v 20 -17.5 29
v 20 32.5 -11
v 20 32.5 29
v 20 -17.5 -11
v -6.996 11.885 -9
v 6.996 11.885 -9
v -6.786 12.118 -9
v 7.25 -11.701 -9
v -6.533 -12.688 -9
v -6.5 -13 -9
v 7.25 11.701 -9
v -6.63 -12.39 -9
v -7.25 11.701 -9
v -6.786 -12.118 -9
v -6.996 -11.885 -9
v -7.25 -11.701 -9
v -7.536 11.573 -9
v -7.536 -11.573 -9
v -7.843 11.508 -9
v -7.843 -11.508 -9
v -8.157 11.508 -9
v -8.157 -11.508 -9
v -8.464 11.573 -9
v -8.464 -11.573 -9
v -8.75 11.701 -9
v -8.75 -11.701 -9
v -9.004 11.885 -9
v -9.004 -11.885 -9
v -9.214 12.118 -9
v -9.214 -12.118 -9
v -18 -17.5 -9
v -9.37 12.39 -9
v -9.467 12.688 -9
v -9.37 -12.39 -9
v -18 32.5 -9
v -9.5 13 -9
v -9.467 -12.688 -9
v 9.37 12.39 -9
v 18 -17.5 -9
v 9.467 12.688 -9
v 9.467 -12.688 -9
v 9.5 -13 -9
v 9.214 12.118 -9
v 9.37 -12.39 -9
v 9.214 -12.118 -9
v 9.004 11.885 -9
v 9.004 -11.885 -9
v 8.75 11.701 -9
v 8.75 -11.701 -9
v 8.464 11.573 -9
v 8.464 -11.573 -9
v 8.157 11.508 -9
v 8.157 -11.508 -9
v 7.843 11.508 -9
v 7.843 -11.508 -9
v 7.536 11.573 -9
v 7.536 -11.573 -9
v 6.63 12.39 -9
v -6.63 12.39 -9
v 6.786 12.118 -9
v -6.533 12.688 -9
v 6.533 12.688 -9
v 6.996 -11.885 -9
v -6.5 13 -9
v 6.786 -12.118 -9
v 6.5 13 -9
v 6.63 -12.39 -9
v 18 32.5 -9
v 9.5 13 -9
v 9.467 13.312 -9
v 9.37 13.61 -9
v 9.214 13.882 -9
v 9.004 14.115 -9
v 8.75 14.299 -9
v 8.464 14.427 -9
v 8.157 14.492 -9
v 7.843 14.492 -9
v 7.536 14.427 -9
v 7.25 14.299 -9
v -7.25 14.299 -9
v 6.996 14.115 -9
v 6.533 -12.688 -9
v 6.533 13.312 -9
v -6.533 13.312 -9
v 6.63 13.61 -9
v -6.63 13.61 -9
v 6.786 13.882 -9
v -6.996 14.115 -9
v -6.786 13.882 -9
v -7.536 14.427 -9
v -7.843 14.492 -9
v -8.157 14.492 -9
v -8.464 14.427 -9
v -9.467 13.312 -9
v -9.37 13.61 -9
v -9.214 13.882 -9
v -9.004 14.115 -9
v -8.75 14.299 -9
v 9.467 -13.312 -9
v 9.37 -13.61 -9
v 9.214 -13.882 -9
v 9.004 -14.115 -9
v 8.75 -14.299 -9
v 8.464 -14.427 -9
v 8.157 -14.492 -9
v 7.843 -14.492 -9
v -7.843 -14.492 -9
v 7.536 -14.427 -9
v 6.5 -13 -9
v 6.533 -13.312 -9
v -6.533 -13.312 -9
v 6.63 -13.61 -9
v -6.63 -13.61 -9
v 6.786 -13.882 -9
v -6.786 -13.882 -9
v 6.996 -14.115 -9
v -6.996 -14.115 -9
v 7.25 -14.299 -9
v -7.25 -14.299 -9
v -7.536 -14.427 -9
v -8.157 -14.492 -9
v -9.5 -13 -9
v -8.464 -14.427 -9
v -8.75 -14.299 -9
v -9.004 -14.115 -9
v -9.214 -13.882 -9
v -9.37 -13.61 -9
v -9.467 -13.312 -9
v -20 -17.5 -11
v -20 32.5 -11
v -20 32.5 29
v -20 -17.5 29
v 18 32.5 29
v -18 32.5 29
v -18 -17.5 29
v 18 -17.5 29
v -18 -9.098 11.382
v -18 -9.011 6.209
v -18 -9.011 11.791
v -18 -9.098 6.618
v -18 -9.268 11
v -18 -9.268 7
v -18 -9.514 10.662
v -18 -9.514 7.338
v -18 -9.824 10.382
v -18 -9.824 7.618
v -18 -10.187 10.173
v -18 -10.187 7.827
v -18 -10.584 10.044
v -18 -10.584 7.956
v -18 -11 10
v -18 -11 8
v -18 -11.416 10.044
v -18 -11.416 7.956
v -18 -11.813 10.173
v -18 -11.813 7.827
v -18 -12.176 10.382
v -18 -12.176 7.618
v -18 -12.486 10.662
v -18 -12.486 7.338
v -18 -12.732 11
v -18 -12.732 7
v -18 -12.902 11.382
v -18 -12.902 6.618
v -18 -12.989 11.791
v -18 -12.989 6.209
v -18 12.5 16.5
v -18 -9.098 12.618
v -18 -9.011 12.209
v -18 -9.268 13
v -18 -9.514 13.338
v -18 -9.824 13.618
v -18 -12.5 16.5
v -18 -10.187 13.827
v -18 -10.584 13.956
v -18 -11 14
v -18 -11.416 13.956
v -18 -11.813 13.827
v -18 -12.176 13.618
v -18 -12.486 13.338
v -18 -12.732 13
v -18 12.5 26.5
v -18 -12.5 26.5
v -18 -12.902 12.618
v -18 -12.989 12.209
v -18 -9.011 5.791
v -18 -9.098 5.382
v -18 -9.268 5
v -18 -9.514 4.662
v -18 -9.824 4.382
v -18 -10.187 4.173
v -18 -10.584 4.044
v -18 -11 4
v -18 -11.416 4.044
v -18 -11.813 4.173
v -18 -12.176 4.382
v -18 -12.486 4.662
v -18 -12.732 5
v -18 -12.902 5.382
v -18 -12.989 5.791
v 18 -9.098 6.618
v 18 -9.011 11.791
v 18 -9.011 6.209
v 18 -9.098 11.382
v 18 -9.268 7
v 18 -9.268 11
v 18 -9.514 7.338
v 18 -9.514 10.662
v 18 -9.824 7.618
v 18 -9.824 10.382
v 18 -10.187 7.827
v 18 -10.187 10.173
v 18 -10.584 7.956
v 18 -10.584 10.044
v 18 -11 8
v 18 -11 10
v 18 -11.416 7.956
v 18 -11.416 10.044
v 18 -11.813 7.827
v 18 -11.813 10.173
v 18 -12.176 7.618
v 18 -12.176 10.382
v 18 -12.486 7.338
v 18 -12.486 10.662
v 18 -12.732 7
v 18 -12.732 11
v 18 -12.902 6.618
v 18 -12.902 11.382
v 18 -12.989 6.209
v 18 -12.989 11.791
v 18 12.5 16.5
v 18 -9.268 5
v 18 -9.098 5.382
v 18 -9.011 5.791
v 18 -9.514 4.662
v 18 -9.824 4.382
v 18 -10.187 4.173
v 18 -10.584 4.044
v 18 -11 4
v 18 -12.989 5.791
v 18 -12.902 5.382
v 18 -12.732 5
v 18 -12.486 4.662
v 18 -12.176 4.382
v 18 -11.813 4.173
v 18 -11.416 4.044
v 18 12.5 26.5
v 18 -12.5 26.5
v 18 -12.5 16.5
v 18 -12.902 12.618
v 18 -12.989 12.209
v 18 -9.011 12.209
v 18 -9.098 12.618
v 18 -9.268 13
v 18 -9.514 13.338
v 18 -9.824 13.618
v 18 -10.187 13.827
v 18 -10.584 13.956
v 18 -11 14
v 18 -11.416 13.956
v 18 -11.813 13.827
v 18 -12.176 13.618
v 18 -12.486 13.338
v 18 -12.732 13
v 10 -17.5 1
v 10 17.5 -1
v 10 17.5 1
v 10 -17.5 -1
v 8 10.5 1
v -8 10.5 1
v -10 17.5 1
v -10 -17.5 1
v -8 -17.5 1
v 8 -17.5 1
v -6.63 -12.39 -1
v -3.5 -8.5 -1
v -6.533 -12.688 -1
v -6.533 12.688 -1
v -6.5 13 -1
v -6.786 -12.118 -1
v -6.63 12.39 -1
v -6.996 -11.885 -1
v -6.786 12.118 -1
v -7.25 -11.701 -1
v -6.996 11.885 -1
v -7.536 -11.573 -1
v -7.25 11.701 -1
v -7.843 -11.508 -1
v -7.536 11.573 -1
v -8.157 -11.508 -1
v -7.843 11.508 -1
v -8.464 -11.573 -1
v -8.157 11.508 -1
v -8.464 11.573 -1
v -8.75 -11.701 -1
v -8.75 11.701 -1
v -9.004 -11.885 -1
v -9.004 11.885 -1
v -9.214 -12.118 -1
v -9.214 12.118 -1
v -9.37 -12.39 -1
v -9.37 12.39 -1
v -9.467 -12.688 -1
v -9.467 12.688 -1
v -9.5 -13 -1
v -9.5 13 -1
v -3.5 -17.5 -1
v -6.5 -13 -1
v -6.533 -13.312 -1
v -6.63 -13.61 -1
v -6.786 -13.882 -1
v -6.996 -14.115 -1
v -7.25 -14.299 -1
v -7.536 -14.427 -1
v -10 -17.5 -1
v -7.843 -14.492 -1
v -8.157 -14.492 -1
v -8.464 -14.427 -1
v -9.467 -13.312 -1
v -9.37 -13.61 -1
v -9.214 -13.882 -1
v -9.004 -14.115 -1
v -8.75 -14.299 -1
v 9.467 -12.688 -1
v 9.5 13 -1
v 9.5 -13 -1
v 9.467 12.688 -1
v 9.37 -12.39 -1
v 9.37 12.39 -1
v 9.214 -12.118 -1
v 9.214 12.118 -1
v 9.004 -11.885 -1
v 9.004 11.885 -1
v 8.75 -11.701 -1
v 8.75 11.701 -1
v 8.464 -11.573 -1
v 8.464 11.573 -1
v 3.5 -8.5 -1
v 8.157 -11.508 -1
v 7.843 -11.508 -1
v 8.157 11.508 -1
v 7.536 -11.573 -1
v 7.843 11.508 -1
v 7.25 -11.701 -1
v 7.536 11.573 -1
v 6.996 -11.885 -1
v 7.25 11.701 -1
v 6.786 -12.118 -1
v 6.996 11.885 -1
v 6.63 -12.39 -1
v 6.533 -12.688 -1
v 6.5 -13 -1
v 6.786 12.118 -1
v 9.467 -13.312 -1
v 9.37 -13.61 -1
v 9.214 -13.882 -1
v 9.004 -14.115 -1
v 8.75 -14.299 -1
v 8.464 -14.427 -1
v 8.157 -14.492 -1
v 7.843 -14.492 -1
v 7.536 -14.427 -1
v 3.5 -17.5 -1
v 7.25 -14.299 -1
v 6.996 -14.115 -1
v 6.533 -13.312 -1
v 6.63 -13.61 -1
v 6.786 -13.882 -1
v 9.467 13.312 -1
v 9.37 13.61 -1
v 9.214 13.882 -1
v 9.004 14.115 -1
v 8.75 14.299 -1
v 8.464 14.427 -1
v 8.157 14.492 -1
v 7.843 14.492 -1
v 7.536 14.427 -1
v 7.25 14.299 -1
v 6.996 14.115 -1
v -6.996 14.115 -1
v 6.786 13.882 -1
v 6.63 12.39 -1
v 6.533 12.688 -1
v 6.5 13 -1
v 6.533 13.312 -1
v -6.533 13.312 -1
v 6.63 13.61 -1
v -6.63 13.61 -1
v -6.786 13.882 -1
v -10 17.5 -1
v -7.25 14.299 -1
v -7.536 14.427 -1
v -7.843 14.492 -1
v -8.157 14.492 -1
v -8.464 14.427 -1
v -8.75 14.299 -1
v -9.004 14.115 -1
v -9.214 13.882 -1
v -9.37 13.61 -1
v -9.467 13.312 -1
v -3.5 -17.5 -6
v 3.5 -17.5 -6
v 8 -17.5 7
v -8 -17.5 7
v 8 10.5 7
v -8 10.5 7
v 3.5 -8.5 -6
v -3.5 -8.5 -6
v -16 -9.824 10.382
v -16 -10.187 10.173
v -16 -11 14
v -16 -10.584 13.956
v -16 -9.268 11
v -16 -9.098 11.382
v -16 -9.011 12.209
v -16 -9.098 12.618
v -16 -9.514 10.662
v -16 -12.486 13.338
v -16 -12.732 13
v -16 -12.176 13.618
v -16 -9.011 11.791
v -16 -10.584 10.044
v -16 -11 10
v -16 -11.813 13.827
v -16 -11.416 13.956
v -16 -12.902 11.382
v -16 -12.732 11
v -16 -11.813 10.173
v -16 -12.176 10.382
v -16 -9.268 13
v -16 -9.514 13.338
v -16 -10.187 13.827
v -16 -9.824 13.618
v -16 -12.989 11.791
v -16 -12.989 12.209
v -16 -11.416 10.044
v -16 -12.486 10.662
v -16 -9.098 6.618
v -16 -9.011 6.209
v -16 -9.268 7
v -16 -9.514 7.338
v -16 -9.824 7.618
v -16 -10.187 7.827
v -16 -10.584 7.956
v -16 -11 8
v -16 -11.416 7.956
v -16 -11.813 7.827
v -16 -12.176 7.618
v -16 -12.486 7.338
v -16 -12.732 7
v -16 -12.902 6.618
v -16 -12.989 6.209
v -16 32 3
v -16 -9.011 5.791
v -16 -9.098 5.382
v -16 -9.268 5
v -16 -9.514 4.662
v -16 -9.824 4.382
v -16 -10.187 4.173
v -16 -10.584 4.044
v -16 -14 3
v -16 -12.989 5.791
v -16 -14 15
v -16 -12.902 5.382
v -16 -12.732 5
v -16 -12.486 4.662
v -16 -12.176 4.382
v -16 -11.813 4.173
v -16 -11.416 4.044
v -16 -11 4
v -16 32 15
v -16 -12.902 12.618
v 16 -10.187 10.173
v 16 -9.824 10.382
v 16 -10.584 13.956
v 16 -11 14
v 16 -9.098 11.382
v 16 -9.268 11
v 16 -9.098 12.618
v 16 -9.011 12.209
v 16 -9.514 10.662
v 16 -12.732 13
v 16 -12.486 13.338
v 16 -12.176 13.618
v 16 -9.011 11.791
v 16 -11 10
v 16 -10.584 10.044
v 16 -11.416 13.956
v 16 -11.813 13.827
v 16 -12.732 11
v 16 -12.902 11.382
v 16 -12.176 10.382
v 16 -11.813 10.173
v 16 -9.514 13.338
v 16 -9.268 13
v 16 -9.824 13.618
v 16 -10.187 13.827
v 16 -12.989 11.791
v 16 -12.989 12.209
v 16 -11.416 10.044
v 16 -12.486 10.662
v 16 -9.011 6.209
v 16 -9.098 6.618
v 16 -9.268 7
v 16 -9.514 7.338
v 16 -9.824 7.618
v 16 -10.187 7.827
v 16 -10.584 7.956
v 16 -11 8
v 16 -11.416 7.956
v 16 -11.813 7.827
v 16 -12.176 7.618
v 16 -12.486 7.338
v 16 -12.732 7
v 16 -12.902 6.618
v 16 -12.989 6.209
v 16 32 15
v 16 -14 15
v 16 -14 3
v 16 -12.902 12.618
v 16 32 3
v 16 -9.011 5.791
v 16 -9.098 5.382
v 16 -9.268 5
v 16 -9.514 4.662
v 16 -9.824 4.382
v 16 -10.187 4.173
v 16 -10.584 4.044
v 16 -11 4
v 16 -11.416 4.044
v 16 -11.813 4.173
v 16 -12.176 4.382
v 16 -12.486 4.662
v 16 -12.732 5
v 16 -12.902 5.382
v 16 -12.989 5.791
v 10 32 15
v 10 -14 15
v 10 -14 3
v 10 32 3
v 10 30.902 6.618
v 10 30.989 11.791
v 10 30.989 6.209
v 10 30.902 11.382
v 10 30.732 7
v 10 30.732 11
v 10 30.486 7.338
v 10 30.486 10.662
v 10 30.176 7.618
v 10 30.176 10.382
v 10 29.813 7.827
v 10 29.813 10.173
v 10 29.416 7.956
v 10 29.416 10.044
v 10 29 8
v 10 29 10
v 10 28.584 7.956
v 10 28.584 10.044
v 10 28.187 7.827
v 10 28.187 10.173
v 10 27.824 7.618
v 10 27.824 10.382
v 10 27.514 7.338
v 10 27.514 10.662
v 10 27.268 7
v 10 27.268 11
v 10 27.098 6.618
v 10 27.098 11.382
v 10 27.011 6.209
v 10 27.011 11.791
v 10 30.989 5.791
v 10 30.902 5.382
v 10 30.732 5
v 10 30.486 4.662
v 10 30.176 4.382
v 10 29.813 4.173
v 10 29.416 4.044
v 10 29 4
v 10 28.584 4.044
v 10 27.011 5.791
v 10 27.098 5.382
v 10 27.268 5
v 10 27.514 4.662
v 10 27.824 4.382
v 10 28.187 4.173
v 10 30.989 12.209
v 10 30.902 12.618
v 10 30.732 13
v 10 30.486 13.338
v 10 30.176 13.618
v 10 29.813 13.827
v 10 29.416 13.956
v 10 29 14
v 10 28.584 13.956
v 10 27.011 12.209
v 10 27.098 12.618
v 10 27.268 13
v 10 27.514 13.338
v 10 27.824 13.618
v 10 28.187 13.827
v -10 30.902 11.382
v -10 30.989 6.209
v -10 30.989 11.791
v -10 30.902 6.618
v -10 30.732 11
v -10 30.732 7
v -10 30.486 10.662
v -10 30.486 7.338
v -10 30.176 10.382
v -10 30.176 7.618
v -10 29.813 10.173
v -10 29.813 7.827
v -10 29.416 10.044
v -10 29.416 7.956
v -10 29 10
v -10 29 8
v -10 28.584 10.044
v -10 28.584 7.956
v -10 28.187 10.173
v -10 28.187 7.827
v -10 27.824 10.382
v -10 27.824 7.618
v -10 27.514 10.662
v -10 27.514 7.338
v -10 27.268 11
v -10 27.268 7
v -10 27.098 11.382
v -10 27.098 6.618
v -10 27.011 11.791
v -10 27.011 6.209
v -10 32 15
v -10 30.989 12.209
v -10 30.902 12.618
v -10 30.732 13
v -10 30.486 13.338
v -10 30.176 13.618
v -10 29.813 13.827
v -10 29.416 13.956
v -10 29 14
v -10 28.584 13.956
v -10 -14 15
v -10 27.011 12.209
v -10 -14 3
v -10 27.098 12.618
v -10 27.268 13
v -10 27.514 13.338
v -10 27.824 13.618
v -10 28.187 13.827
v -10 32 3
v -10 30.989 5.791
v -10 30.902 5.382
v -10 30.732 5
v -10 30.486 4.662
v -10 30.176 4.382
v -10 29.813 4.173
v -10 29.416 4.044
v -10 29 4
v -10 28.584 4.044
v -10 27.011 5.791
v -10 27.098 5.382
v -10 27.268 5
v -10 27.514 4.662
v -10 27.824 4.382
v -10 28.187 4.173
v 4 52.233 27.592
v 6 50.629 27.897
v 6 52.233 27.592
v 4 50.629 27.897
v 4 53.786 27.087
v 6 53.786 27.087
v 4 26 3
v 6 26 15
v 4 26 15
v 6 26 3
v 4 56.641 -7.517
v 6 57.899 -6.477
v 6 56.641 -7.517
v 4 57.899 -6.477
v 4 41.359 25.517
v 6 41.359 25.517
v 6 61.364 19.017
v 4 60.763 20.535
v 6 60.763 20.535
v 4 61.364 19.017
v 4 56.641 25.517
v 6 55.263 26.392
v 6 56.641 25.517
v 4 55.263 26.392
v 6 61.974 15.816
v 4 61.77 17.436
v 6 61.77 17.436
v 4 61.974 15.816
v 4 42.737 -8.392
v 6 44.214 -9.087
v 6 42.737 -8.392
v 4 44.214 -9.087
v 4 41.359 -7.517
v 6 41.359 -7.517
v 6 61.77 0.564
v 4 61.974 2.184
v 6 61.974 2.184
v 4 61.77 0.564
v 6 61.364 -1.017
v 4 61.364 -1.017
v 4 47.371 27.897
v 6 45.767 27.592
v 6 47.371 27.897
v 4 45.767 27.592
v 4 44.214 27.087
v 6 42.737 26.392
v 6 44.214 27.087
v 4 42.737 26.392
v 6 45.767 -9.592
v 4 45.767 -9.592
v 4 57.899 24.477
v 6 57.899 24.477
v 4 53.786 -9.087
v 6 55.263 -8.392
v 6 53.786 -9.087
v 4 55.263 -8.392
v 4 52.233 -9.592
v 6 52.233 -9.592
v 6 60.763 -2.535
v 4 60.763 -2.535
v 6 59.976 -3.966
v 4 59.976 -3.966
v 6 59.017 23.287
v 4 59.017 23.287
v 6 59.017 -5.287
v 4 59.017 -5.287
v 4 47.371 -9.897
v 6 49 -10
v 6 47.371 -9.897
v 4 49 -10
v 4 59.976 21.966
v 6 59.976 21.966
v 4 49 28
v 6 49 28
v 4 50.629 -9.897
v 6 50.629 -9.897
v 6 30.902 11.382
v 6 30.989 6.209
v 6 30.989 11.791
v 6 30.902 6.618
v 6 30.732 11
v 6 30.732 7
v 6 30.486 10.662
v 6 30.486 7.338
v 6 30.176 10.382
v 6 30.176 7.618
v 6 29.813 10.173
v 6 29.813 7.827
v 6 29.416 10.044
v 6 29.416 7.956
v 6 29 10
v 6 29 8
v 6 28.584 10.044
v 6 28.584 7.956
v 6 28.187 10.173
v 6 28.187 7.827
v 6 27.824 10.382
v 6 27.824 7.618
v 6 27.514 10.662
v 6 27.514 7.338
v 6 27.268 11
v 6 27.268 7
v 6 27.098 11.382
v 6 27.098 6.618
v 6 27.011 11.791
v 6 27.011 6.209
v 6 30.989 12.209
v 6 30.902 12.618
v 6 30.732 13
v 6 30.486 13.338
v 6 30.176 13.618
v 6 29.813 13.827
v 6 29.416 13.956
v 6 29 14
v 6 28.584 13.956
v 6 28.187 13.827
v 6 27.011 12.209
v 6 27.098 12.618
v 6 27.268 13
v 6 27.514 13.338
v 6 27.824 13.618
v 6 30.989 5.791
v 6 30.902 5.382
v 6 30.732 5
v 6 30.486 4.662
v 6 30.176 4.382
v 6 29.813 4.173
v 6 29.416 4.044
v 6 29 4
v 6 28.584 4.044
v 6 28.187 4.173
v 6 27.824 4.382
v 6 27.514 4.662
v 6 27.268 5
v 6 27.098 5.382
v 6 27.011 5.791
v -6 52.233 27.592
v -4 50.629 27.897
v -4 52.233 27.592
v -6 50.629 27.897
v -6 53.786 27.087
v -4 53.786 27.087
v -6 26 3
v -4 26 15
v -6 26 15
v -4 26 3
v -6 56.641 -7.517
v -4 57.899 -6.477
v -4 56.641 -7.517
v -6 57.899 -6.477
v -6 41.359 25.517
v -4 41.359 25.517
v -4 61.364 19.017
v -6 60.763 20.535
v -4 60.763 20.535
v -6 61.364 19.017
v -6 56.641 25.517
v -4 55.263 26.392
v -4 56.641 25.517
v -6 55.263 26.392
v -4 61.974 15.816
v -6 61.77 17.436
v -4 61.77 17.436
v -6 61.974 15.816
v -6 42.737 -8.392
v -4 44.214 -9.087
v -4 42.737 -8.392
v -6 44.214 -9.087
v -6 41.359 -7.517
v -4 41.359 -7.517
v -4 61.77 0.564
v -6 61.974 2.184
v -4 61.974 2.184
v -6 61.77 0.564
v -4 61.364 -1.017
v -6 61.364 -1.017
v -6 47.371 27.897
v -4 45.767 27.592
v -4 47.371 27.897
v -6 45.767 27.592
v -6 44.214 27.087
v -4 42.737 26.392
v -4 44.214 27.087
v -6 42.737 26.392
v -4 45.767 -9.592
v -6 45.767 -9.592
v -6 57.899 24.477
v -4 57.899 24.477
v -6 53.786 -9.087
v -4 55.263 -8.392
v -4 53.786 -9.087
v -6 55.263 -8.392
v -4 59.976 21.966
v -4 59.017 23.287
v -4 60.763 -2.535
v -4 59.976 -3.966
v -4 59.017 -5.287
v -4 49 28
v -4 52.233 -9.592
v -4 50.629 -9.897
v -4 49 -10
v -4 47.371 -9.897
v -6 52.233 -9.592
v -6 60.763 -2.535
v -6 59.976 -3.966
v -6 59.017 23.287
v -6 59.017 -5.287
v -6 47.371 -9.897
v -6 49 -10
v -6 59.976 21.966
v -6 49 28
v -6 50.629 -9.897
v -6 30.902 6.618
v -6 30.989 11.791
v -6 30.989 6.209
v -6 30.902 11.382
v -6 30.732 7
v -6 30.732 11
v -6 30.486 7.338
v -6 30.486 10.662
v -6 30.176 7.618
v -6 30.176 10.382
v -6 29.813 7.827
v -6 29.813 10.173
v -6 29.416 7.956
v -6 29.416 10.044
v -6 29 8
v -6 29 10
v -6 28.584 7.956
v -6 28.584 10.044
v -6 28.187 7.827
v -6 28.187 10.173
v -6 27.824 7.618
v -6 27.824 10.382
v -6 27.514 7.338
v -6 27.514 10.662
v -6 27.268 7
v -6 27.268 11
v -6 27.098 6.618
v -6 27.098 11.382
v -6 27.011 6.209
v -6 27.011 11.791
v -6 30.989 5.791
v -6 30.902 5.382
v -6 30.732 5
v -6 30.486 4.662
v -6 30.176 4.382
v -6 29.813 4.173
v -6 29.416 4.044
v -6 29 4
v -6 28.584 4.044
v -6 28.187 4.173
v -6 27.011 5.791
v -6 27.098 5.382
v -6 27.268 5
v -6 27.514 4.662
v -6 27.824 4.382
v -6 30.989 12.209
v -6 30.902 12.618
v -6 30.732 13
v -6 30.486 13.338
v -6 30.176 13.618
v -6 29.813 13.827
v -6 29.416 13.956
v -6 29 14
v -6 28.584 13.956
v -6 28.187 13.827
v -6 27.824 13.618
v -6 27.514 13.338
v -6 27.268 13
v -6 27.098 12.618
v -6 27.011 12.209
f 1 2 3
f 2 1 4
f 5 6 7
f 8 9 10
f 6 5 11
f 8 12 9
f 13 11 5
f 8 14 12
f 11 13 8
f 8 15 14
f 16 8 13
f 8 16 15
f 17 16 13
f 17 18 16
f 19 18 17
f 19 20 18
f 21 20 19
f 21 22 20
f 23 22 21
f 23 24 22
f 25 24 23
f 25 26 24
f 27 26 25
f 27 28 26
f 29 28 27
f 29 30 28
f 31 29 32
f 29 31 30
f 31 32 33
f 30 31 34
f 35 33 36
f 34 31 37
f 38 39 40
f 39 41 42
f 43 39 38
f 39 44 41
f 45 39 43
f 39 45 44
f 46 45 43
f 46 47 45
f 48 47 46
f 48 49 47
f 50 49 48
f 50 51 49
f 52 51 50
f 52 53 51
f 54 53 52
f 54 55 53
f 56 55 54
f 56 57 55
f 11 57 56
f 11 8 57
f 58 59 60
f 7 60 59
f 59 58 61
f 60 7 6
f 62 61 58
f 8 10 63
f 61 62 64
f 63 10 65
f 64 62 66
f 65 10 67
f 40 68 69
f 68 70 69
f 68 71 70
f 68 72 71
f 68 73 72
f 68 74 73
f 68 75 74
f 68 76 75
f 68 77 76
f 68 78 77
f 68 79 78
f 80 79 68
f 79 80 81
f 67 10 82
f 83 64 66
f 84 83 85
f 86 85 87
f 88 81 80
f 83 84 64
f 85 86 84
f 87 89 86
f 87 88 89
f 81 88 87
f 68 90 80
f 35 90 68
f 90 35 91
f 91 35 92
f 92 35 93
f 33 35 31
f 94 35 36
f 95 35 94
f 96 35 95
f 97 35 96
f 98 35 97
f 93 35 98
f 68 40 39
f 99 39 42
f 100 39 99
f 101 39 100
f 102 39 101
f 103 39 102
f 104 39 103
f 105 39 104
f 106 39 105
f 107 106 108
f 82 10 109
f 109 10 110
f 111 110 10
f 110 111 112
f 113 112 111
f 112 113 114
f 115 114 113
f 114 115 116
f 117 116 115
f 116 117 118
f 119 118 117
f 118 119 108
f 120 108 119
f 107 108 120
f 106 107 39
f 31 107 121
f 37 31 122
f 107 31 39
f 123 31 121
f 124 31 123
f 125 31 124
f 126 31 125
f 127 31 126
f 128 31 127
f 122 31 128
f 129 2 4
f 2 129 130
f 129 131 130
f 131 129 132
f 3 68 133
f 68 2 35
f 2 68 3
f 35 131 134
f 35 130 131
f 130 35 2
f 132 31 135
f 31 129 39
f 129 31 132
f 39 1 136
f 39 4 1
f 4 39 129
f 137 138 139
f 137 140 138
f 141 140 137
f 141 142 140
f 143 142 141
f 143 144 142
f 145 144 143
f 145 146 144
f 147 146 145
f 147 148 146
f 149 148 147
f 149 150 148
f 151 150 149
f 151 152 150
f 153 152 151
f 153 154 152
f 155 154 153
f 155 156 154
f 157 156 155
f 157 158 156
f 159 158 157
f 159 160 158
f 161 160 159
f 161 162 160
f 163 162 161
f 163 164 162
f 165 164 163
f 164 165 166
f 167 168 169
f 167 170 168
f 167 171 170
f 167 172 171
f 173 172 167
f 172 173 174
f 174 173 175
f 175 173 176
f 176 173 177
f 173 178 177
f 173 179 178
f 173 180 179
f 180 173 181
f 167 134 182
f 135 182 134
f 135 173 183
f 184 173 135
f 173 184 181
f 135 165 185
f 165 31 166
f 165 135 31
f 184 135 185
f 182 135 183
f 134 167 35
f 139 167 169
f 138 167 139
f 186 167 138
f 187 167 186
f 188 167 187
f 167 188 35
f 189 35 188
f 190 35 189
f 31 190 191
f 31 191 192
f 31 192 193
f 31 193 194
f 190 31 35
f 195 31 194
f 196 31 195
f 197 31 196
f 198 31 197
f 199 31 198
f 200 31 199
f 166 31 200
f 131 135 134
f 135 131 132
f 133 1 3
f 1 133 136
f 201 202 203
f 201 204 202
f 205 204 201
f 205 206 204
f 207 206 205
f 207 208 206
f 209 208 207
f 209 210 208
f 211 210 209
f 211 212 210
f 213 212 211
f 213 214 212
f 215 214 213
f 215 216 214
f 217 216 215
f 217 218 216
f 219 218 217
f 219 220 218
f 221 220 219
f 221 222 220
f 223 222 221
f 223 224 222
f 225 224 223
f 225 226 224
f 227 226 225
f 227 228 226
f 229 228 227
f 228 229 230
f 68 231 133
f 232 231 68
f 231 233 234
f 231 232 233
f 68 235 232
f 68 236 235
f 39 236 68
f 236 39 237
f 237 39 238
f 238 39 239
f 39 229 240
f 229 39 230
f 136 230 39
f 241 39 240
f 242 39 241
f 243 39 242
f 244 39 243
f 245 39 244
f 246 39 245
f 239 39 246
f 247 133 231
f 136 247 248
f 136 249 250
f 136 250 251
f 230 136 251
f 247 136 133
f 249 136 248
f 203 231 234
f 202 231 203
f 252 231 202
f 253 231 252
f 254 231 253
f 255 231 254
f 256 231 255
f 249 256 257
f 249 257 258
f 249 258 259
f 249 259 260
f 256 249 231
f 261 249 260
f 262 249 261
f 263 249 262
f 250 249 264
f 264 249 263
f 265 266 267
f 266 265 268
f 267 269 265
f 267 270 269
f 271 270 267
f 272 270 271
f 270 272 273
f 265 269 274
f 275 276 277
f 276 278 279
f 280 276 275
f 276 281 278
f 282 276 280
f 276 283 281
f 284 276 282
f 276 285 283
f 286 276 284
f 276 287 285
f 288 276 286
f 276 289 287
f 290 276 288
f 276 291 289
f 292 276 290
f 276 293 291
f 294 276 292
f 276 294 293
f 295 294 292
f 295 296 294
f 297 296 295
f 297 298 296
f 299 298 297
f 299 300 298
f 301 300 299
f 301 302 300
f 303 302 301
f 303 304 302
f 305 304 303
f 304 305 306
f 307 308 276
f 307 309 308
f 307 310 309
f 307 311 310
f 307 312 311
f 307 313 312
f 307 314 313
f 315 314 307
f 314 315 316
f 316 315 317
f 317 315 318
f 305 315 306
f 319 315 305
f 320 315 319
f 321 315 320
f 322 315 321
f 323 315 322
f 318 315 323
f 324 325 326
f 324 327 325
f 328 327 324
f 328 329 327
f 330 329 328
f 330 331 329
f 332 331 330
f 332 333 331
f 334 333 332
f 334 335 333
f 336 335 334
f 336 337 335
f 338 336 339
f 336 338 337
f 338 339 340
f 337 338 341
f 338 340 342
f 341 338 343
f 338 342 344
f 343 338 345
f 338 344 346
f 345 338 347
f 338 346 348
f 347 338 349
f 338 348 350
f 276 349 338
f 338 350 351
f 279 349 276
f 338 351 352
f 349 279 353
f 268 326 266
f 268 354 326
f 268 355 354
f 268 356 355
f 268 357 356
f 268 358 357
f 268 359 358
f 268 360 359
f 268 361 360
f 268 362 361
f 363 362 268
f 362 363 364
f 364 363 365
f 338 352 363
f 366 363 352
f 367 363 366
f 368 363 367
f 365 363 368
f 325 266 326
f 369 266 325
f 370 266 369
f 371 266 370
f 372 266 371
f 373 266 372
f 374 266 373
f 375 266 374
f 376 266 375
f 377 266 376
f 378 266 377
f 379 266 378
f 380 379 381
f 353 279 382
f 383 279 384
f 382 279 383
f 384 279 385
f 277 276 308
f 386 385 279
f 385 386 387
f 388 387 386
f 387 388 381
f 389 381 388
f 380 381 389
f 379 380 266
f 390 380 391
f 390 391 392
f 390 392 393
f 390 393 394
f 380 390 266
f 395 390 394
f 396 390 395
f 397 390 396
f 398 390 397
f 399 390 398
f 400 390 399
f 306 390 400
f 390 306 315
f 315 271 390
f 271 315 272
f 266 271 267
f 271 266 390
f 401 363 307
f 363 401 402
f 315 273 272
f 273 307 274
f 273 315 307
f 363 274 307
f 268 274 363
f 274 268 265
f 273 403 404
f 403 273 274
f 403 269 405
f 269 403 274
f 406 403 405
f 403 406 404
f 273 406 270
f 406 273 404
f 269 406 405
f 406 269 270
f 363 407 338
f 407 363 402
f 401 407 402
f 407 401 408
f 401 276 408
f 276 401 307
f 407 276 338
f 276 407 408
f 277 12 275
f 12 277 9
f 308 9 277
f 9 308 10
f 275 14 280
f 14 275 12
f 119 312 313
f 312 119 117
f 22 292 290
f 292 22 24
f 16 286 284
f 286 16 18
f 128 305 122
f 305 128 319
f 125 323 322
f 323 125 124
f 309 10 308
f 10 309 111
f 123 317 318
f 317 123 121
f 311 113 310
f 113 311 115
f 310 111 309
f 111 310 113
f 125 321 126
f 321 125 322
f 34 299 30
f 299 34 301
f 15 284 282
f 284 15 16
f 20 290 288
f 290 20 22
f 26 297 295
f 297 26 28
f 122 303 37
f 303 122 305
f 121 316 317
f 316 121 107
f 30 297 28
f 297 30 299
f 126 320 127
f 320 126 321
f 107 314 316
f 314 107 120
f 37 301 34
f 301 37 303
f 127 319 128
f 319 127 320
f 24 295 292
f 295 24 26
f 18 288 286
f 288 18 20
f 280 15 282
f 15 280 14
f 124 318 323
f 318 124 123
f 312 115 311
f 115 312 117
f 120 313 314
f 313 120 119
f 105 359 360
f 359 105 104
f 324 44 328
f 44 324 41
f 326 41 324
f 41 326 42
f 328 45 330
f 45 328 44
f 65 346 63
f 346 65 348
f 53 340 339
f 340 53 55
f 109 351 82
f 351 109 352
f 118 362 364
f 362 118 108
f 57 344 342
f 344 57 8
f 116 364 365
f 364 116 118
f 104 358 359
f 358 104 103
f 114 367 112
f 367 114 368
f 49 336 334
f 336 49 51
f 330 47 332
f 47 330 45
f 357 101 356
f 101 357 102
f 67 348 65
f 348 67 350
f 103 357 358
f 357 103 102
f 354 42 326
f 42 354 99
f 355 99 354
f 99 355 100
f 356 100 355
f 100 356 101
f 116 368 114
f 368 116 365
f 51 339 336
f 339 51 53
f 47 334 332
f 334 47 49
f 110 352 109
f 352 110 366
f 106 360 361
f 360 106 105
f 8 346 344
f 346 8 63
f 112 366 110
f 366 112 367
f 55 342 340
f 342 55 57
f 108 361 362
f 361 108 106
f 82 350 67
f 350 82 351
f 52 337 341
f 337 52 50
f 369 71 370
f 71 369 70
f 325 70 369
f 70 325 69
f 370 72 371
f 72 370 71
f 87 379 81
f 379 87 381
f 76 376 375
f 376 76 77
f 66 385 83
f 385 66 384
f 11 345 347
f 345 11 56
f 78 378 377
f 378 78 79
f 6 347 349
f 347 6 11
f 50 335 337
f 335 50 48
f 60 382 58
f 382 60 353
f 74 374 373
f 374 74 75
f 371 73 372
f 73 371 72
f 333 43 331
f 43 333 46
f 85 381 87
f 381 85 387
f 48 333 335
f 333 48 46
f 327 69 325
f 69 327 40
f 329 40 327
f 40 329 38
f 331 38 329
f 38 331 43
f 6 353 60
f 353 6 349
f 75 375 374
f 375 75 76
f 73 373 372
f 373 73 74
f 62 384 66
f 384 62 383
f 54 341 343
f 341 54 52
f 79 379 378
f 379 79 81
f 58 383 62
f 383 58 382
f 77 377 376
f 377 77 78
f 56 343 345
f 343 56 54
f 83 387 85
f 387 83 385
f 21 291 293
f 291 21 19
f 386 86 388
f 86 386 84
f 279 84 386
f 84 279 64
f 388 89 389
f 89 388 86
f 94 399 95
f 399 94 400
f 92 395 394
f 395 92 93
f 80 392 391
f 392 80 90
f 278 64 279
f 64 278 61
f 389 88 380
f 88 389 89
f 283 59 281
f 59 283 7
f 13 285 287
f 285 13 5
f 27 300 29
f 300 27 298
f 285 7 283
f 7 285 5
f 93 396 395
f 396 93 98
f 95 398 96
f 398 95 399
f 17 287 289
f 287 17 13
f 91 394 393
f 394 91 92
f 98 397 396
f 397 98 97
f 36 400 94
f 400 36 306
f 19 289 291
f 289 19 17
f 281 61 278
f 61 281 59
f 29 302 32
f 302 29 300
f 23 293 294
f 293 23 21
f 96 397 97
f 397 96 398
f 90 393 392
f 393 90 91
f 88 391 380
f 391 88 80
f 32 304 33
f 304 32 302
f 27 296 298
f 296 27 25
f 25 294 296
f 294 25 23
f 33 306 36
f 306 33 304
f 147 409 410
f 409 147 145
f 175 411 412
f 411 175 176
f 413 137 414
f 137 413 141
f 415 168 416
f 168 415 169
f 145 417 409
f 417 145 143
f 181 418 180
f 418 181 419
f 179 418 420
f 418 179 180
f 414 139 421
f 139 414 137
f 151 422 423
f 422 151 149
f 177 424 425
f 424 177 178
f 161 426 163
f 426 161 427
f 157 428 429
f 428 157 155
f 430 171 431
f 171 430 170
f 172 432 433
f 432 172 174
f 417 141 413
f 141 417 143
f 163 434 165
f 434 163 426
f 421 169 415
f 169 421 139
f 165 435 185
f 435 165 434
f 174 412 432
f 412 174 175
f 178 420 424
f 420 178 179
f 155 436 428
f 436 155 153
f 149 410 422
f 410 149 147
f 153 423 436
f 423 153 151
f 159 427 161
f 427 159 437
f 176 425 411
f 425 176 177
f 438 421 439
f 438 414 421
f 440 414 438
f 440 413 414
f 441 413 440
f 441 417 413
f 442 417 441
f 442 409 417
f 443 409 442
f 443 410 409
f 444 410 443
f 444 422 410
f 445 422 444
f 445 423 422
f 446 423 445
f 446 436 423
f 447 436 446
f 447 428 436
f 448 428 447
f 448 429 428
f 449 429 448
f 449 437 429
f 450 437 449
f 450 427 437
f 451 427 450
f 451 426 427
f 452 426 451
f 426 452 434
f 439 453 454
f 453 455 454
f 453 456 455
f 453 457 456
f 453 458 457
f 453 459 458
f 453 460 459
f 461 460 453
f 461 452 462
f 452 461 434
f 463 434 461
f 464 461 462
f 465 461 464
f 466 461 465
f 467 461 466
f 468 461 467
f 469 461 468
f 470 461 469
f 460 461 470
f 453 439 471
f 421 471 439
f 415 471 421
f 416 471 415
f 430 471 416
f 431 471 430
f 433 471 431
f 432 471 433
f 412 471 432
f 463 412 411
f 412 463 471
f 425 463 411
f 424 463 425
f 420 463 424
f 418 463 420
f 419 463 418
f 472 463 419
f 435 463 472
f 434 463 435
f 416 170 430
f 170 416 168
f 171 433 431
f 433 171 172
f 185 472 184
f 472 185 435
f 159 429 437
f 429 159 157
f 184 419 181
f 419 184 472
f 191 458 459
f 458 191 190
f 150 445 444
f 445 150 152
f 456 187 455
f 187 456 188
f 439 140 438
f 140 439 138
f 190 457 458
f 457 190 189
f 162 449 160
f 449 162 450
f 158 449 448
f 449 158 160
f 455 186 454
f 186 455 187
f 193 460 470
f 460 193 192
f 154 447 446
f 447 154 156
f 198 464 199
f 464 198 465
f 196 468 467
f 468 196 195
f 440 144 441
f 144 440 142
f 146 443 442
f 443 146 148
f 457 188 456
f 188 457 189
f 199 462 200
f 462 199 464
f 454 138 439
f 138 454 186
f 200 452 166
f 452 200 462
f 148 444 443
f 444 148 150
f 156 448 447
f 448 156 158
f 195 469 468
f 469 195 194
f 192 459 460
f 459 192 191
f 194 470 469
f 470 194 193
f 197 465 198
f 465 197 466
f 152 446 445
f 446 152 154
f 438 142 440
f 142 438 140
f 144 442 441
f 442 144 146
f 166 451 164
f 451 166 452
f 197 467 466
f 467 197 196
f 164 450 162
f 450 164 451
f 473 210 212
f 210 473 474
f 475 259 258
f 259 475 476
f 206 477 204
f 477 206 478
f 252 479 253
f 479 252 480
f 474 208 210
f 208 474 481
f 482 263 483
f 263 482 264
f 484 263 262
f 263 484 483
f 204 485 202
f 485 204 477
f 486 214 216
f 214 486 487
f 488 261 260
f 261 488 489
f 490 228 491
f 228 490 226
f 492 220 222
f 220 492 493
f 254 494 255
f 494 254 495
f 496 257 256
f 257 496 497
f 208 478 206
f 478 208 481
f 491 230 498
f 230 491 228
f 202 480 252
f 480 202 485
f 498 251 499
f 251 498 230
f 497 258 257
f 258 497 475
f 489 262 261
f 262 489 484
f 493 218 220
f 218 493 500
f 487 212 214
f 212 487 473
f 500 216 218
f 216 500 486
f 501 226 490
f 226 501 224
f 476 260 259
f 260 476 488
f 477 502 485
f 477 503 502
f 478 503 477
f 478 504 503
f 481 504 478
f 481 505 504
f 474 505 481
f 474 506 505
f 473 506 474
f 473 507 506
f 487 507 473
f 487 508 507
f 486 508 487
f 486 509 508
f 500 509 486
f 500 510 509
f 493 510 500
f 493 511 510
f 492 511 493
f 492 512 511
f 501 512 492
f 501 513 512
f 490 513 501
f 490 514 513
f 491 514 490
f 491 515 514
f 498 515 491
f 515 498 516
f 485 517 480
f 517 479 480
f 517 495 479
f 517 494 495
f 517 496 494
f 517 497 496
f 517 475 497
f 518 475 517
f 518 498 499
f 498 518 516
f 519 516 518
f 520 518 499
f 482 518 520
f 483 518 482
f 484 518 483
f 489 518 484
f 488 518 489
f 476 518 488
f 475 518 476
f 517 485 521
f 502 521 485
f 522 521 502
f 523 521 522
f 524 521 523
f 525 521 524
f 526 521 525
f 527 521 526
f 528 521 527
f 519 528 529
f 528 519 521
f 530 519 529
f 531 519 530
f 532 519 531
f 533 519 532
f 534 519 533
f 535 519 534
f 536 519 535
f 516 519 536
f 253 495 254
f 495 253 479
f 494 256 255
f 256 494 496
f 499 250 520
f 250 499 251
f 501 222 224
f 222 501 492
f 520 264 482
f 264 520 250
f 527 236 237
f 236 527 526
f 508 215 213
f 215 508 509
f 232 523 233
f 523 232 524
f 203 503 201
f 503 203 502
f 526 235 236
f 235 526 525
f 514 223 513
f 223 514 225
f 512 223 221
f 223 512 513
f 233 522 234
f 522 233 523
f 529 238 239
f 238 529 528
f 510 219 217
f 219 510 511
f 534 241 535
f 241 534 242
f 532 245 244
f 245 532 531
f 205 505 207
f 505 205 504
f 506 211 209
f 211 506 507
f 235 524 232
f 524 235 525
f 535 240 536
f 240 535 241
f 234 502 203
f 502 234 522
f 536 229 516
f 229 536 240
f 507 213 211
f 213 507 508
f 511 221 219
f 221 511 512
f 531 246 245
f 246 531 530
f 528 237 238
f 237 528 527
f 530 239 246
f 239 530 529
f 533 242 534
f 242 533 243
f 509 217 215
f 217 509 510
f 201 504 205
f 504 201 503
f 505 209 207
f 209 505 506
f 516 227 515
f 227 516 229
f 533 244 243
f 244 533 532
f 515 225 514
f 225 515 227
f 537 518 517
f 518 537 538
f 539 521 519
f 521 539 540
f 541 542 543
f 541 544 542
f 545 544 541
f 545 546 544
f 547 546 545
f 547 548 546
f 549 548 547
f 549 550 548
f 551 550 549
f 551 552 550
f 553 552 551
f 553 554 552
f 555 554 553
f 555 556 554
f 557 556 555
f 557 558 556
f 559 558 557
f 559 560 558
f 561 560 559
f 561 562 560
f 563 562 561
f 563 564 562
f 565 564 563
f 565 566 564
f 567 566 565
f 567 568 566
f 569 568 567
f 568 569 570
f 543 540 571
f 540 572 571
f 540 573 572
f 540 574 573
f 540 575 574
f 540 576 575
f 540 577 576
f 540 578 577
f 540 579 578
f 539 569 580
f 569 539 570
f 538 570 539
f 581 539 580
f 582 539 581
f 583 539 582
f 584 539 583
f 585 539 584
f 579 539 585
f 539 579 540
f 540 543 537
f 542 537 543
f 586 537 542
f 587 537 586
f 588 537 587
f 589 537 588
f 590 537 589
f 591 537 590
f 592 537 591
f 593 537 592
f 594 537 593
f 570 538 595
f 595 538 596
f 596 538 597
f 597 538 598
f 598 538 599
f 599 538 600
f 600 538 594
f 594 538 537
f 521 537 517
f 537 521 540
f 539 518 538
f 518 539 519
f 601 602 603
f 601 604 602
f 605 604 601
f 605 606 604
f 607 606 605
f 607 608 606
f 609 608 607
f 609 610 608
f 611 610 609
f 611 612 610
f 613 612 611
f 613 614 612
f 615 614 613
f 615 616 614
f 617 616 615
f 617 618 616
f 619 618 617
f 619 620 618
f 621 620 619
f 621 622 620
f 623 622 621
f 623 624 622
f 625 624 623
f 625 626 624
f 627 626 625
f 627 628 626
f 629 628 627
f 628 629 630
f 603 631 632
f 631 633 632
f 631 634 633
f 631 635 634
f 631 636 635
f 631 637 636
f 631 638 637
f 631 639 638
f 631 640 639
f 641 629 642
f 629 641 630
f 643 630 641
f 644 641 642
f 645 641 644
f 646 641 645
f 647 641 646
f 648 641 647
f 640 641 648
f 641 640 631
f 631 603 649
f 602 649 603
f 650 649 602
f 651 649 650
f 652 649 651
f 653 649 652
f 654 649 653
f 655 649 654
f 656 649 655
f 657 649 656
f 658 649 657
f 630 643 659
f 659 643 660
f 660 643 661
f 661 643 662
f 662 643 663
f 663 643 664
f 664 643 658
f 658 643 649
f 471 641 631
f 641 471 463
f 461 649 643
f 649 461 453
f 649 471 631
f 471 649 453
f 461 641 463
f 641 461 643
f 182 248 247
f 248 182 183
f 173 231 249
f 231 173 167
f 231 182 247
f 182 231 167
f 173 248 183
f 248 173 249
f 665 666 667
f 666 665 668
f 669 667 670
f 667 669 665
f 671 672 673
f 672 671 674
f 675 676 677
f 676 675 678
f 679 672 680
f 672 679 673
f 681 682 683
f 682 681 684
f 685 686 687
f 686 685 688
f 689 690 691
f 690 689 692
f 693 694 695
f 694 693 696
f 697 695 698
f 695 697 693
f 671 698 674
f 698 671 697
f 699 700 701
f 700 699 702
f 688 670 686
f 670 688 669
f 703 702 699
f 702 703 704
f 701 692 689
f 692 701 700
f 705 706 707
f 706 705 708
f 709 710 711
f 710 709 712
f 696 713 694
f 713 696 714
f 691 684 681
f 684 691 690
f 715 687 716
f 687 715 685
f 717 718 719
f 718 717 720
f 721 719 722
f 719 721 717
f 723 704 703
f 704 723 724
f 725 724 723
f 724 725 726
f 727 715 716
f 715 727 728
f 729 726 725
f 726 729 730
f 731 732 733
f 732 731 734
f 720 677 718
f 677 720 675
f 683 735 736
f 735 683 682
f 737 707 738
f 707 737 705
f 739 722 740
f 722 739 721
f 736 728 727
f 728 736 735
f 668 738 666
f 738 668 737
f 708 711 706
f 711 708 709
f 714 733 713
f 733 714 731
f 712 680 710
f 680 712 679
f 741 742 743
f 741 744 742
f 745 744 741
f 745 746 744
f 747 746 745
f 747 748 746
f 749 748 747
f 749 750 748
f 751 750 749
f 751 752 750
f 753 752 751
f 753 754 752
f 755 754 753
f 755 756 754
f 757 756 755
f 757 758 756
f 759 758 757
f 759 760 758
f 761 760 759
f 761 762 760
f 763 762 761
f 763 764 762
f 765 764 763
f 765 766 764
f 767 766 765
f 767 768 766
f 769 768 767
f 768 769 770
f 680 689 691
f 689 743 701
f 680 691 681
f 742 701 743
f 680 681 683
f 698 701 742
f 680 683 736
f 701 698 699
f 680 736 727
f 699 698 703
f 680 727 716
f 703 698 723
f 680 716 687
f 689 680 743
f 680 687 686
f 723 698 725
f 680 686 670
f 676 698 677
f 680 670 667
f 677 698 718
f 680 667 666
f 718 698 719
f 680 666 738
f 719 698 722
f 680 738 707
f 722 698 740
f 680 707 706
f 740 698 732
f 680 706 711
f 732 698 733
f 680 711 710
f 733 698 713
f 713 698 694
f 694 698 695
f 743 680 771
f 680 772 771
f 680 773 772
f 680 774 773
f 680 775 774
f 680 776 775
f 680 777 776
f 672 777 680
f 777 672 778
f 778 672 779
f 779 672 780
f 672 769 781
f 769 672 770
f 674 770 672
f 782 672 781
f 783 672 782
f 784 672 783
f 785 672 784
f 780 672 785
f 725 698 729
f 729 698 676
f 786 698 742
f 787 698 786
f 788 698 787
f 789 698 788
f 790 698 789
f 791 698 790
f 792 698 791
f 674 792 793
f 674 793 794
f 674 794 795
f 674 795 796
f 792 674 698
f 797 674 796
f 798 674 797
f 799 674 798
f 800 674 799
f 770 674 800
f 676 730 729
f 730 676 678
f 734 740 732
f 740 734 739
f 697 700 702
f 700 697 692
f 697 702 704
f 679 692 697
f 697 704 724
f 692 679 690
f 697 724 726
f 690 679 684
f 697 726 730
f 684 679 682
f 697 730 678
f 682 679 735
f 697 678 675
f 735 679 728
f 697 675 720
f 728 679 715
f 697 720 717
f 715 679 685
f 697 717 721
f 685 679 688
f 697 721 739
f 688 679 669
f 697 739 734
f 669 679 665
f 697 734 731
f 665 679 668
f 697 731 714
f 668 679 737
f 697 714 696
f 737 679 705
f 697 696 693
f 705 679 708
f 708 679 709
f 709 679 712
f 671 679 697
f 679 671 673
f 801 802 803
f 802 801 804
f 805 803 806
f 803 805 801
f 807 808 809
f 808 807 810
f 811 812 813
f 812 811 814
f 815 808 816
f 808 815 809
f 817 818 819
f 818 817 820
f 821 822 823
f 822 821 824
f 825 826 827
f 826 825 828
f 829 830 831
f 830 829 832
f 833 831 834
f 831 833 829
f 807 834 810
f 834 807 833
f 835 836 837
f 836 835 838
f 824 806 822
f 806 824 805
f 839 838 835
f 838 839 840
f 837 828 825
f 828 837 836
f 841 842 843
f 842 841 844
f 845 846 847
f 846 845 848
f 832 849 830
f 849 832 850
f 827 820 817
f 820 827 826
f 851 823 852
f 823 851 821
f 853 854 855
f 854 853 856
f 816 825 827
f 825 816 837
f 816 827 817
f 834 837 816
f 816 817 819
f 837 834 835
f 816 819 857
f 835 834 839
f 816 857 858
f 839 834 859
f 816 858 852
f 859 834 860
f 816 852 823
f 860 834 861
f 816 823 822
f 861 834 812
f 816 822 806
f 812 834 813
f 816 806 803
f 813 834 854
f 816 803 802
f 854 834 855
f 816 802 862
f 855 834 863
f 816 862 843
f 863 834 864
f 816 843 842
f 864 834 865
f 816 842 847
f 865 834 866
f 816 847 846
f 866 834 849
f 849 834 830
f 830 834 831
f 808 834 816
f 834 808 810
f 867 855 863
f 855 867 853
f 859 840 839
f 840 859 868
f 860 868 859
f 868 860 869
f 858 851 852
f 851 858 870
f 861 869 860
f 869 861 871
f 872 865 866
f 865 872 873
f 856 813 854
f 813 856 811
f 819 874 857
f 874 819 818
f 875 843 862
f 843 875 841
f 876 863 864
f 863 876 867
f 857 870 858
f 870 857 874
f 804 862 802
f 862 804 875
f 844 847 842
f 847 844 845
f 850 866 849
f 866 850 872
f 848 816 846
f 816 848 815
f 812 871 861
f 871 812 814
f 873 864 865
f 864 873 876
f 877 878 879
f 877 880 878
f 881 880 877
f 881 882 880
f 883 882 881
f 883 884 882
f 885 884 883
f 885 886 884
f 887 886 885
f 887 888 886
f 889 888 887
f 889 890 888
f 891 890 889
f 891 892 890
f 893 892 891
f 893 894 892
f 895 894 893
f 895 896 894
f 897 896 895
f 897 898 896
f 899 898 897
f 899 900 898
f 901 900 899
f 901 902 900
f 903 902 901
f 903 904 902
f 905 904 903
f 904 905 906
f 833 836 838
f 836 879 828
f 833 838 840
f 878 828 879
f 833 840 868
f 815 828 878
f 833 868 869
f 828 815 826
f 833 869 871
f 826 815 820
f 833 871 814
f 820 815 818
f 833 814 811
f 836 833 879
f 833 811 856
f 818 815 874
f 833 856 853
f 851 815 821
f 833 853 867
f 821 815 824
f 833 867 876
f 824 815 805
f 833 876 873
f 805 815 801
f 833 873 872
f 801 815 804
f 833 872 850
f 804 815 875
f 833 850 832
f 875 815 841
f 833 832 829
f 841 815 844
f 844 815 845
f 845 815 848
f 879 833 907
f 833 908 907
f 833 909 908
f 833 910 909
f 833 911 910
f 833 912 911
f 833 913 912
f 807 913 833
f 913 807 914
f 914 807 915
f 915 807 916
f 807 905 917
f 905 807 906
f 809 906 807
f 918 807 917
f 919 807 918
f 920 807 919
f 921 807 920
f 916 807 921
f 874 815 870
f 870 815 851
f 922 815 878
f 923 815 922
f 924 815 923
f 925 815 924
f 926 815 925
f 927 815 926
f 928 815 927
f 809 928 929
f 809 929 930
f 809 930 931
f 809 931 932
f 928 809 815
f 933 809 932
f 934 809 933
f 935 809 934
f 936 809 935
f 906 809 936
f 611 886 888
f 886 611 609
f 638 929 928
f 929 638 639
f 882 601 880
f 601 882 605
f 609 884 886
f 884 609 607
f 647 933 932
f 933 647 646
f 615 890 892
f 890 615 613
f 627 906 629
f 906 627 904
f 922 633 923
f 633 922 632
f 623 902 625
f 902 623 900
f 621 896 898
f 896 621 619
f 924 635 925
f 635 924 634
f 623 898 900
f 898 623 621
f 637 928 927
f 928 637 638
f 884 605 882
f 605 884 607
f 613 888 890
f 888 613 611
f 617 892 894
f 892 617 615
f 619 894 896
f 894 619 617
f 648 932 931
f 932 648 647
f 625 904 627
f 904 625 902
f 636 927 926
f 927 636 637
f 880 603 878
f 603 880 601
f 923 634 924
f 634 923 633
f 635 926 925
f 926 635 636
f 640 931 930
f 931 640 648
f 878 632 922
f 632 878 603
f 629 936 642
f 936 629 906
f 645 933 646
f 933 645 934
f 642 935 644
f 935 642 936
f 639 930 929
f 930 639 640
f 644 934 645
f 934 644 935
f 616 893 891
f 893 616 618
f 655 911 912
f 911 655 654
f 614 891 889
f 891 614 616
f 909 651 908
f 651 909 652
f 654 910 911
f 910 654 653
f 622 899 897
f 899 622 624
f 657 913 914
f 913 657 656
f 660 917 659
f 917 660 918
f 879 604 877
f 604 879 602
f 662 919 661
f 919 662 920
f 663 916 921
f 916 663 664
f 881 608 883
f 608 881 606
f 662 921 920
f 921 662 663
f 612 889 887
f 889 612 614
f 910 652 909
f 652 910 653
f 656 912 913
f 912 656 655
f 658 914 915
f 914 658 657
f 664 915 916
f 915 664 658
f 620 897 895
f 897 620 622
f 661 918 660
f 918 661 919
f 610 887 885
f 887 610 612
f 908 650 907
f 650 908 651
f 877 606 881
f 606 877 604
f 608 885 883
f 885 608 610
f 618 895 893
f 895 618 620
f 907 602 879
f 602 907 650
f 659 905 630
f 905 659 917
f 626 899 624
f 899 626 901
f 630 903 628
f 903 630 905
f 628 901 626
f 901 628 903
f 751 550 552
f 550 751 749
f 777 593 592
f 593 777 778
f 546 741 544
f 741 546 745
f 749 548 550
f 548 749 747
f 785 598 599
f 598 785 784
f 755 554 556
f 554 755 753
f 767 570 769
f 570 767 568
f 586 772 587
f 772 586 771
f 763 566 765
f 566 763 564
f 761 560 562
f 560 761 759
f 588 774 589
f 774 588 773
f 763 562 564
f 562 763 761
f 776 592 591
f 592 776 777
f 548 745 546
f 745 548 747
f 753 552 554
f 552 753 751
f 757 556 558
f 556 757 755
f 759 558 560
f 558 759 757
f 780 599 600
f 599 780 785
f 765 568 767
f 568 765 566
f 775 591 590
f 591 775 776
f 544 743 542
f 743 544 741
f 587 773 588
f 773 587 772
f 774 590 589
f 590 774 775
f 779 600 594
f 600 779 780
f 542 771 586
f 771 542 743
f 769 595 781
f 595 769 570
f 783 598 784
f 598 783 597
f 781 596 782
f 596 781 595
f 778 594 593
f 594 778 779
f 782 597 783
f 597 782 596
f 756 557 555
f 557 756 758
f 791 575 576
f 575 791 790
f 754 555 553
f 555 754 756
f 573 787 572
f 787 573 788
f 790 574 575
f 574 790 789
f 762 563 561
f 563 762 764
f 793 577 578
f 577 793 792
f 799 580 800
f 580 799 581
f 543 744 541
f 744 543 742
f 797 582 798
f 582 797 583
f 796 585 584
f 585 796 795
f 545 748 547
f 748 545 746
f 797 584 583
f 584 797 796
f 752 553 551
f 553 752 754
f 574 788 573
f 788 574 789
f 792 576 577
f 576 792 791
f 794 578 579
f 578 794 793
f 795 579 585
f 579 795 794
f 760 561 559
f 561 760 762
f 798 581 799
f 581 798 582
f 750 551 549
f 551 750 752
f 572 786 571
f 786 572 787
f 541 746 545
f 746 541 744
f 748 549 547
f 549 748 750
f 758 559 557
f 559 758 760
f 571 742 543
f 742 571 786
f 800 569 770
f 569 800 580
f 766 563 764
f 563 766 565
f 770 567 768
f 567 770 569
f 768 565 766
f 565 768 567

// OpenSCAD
//obudowa
translate([0,7.5,-10]){
color("grey")cube([40,50,2],true);
}
/*
translate([0,7.5,28]){
color("grey")cube([40,50,2],true);
}
*/
translate([-19,7.5,9]){
color("grey")cube([2,50,40],true);
}
translate([19,7.5,9]){
color("grey")cube([2,50,40],true);
}

//elektronika
translate([0,0,0]){
color("green")cube([20,35,2],true);
}
//trinket
translate([0,-3.5,4]){    
color("red")cube([16,28,6],true);
}
//gniazdo
translate([0,-13,-3.5]){    
color("yellow")cube([7,9,5],true);
}

//dystanse elektronika
translate([-8,-13,-9]){    
color("black")cylinder(8,1.5,1.5,$fn=30);
}
translate([8,-13,-9]){    
color("black")cylinder(8,1.5,1.5,$fn=30);
}
translate([8,13,-9]){    
color("black")cylinder(8,1.5,1.5,$fn=30);
}
translate([-8,13,-9]){    
color("black")cylinder(8,1.5,1.5,$fn=30);
}

//dystanse elektronika tensometry
translate([-18,-11,12]){   
rotate([0,90,0]){    
color("black")cylinder(2,2,2,$fn=30);
}
}
translate([-18,-11,6]){  
rotate([0,90,0]){  
color("black")cylinder(2,2,2,$fn=30);
}
}
translate([16,-11,12]){   
rotate([0,90,0]){    
color("black")cylinder(2,2,2,$fn=30);
}
}
translate([16,-11,6]){  
rotate([0,90,0]){  
color("black")cylinder(2,2,2,$fn=30);
}
}
//tensometry
translate([13,9,9]){
color("blue")cube([6,46,12],true);
}
translate([-13,9,9]){
color("blue")cube([6,46,12],true);
}
//aku
translate([0,0,21.5]){
color("pink")cube([36,25,10],true);
}

//lopatka1
translate([5,29,9]){
hull(){
cube([2,6,12],true);
    
translate([0,20,6]){
rotate([0,90,0]){
cylinder(2,13,13,$fn=50,true);
}
}

translate([0,20,-6]){
rotate([0,90,0]){
cylinder(2,13,13,$fn=50,true);
}
}

}
}

//lopatka2
translate([-5,29,9]){
hull(){
cube([2,6,12],true);
    
translate([0,20,6]){
rotate([0,90,0]){
cylinder(2,13,13,$fn=50,true);
}
}

translate([0,20,-6]){
rotate([0,90,0]){
cylinder(2,13,13,$fn=50,true);
}
}
}
}

//dystanse lopatki
translate([-10,29,12]){   
rotate([0,90,0]){    
color("black")cylinder(4,2,2,$fn=30);
}
}
translate([-10,29,6]){  
rotate([0,90,0]){  
color("black")cylinder(4,2,2,$fn=30);
}
}
translate([6,29,12]){   
rotate([0,90,0]){    
color("black")cylinder(4,2,2,$fn=30);
}
}
translate([6,29,6]){  
rotate([0,90,0]){  
color("black")cylinder(4,2,2,$fn=30);
}
}
